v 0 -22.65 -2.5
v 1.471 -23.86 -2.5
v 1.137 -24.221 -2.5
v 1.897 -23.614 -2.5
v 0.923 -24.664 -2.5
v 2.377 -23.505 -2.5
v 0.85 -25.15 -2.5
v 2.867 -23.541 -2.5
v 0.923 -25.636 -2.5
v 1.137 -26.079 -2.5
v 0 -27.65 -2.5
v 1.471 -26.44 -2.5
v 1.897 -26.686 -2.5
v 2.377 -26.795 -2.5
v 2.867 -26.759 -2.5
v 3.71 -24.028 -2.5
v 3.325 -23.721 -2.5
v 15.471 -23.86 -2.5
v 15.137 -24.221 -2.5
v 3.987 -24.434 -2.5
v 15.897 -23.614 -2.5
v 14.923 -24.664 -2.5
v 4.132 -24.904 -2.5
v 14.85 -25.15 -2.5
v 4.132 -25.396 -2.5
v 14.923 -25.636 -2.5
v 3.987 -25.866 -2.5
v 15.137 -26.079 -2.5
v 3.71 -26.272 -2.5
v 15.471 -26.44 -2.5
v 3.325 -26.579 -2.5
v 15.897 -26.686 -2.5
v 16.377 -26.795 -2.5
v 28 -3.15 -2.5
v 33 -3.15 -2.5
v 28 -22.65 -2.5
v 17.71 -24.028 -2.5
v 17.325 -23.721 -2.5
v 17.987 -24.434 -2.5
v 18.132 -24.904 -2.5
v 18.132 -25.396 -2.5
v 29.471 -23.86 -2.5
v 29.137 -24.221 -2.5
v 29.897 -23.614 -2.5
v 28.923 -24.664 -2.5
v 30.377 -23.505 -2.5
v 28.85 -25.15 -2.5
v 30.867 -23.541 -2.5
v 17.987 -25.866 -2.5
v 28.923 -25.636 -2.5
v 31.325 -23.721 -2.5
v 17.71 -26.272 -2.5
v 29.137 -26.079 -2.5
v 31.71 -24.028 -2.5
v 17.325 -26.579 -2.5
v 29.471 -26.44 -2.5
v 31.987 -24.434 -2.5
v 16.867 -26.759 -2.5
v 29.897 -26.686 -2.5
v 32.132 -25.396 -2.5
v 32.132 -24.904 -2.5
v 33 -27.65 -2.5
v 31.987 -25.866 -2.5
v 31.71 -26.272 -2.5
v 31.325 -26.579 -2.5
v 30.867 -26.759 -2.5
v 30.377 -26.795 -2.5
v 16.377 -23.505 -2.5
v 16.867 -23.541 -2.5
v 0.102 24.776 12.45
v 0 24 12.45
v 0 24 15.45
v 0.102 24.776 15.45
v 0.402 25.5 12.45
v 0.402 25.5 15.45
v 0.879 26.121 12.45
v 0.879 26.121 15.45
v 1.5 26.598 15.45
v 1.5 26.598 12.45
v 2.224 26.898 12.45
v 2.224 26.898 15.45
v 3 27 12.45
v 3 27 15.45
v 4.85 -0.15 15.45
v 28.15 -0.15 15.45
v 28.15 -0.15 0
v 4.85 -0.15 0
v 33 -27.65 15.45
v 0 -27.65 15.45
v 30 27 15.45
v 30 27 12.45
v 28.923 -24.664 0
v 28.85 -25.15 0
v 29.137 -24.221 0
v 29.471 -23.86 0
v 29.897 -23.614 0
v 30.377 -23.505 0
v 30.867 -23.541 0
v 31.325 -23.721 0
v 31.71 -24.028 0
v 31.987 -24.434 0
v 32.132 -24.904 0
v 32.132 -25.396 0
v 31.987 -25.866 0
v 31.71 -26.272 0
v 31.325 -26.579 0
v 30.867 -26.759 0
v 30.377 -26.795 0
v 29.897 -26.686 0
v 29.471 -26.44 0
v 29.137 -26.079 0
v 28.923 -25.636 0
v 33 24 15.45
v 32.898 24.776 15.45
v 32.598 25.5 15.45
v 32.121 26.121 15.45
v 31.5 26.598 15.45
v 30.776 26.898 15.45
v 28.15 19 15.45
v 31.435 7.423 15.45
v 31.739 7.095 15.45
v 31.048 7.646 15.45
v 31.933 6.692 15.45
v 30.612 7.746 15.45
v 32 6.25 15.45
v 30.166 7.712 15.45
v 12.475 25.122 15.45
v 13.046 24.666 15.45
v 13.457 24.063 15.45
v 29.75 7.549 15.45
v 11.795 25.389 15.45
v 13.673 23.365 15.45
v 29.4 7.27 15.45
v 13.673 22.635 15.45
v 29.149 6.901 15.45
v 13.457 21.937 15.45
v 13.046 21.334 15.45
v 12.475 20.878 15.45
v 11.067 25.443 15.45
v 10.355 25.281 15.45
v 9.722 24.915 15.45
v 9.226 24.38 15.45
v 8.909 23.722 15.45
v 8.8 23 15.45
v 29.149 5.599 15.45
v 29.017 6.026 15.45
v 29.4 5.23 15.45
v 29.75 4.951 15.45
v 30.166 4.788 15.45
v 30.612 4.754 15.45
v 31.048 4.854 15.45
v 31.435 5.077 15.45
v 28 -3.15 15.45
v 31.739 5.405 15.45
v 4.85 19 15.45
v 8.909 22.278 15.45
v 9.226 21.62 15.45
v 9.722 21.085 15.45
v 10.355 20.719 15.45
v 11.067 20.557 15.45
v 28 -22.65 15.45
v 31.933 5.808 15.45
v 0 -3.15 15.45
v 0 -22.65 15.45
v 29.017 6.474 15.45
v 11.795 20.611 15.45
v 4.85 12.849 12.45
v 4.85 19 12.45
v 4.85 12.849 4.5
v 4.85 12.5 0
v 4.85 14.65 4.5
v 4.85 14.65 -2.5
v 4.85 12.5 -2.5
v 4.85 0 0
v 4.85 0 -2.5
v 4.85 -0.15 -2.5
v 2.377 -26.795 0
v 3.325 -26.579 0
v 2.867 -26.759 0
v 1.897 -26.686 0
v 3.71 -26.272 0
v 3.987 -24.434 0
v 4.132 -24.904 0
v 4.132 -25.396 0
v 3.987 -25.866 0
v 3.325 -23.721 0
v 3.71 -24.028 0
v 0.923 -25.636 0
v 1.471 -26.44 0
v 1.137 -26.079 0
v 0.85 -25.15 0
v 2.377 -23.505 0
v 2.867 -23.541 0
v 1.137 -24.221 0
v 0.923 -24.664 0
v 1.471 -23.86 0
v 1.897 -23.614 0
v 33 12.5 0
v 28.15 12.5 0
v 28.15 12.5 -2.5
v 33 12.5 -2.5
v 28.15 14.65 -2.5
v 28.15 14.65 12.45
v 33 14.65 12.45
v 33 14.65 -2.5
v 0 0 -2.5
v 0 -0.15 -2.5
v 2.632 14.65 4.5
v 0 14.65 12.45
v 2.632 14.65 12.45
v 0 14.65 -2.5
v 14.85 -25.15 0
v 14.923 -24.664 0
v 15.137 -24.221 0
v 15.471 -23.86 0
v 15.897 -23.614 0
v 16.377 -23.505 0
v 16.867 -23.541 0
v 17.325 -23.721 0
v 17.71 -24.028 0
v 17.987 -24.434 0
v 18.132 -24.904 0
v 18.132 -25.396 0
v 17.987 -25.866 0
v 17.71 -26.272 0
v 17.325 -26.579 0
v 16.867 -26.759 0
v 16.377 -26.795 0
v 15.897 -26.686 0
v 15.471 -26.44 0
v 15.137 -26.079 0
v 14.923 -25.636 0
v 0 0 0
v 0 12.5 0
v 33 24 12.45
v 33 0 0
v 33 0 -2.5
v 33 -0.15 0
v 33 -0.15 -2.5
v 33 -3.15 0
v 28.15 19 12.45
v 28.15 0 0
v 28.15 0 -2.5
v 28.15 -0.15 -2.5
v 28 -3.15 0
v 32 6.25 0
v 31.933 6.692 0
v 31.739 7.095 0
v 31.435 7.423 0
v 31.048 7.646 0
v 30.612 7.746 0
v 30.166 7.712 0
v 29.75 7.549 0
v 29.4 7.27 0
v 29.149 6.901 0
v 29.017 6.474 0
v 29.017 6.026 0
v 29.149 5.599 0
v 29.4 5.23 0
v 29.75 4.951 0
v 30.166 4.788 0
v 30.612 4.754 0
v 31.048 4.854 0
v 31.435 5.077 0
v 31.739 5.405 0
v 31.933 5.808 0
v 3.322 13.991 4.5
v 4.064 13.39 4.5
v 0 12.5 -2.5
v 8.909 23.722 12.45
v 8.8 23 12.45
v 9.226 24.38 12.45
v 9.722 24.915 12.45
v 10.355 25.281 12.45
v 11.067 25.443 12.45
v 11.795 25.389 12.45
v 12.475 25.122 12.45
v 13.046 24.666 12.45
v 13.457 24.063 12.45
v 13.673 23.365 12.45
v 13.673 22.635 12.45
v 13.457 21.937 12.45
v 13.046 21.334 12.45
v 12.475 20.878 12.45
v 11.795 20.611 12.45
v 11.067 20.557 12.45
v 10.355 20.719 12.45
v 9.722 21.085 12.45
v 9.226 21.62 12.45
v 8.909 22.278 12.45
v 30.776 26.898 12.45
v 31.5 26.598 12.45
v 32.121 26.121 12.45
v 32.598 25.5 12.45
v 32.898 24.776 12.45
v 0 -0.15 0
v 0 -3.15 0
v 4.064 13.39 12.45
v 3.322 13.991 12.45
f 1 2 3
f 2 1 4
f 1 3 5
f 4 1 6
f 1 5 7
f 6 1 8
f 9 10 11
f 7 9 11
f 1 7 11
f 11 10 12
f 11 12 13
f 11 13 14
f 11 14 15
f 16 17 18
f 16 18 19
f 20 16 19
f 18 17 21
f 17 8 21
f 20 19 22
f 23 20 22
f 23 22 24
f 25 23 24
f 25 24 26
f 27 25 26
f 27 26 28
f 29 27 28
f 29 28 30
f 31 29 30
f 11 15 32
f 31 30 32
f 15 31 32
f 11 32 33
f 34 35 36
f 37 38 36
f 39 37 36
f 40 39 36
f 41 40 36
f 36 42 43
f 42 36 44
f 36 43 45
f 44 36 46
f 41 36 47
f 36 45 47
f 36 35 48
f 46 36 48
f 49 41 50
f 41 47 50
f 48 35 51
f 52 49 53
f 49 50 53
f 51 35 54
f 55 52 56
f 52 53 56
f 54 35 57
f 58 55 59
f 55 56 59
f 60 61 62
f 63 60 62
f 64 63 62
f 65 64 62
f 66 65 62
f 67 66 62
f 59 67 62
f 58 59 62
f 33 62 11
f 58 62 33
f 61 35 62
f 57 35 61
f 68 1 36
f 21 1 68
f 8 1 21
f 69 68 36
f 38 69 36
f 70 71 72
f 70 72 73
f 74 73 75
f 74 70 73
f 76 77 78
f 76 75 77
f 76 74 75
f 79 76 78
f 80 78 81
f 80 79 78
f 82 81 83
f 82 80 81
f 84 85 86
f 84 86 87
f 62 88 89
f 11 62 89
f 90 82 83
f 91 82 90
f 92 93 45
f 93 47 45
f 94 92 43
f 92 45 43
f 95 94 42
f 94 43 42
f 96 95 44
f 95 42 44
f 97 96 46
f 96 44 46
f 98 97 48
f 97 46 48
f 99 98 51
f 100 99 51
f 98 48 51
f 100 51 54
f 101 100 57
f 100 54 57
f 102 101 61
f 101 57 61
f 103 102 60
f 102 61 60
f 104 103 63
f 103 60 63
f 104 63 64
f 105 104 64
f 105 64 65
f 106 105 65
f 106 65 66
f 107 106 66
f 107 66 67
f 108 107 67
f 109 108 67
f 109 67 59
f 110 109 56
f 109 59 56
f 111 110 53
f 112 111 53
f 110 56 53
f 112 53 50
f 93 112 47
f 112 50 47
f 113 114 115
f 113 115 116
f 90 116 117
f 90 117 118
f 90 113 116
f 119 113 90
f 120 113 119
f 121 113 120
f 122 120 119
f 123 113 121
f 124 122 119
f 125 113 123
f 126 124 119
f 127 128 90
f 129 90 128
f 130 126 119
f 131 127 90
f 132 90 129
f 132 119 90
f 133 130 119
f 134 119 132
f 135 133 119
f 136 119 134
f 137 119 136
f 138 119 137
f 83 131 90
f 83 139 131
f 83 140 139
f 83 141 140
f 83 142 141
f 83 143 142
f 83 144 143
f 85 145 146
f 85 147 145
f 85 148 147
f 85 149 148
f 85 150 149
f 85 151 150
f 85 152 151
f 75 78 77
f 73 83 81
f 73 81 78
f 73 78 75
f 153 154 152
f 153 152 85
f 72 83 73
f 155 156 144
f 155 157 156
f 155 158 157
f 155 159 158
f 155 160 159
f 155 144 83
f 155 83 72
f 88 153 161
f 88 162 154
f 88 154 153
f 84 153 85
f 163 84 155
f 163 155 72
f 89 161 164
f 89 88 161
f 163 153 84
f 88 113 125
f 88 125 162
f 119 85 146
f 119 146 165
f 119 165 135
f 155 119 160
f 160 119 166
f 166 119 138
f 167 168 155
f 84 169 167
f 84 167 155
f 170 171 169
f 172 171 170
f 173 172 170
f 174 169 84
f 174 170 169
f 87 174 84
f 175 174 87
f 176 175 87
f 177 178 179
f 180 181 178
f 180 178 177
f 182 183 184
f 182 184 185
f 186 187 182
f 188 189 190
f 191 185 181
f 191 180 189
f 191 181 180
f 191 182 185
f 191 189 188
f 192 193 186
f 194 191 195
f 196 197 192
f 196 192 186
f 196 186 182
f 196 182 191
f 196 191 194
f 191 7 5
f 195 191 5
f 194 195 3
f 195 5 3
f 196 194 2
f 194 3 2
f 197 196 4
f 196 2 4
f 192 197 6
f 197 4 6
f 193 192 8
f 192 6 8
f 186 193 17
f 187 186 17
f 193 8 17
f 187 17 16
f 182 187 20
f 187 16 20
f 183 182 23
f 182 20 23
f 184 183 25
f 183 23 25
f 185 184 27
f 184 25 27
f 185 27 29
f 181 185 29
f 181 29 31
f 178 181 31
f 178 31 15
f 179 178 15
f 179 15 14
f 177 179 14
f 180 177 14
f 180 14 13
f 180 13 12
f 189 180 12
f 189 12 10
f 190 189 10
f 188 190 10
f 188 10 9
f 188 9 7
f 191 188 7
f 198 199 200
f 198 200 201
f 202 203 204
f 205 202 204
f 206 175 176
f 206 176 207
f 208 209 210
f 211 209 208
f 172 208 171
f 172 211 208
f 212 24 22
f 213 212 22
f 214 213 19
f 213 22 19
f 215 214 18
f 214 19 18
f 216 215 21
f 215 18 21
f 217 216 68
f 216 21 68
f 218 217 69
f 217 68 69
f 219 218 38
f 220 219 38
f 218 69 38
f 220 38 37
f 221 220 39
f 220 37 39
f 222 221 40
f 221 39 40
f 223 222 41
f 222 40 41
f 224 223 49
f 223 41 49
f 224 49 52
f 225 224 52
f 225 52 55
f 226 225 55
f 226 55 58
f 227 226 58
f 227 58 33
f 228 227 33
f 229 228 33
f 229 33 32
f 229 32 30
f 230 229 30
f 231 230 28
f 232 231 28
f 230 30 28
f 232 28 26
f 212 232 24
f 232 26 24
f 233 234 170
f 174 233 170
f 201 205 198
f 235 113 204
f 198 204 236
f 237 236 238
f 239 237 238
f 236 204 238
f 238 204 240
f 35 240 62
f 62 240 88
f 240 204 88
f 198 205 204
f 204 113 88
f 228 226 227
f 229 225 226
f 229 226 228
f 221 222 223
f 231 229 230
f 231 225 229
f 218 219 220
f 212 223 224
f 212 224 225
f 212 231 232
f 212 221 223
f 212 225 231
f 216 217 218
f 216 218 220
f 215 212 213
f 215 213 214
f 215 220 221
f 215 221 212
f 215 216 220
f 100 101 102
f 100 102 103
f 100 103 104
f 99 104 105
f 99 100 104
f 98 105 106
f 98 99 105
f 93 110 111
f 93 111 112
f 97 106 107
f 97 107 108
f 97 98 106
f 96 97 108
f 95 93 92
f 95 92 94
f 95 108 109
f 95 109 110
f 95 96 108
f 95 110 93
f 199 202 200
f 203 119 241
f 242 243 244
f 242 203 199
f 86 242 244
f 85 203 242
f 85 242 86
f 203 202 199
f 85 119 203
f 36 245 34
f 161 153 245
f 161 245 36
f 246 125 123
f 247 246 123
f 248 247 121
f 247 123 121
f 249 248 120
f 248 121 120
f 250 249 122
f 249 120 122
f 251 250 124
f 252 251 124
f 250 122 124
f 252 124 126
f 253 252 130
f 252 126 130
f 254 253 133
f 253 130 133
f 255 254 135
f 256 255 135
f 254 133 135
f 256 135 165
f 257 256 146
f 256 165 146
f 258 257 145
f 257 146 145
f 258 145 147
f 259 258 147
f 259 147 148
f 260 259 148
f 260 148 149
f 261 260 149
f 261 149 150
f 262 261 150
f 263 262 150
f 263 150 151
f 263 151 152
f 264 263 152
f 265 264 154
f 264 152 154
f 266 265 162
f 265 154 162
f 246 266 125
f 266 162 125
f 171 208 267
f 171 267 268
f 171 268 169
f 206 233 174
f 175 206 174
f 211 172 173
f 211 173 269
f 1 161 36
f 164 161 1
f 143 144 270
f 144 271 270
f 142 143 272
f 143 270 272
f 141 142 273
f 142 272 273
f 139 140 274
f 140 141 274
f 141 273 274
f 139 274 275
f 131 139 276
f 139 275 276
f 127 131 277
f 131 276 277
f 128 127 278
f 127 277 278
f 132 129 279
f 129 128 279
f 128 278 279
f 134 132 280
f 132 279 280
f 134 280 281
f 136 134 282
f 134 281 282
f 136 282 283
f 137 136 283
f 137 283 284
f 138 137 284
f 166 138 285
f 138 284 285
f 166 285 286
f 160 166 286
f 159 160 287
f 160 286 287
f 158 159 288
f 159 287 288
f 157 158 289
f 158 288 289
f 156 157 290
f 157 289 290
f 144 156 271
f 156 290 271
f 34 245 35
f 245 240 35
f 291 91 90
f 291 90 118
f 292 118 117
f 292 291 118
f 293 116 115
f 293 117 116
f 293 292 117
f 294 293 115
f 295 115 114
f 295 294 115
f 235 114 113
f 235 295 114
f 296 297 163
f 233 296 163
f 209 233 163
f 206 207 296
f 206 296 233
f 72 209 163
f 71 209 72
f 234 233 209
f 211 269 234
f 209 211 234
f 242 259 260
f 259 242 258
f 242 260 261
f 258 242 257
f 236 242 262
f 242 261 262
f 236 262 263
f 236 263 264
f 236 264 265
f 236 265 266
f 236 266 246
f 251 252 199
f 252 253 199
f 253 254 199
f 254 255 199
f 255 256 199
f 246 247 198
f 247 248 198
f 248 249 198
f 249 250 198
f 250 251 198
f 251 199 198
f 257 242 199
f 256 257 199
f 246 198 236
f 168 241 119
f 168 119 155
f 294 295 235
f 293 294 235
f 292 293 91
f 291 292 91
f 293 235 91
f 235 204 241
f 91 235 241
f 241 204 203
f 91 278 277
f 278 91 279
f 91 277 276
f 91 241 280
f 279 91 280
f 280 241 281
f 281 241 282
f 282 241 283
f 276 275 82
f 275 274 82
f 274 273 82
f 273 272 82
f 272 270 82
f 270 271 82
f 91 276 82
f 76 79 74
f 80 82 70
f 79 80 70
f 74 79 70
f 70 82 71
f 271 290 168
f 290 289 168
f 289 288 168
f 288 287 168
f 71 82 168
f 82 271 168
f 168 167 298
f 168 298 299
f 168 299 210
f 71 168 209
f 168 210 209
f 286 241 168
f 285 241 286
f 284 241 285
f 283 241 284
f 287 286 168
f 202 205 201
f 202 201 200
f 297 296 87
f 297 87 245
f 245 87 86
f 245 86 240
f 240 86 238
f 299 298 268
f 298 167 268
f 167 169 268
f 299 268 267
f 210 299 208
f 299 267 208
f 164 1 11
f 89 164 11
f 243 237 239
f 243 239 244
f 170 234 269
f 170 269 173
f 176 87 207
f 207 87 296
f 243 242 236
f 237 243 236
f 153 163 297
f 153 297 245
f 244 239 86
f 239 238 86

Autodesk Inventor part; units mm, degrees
ref_plane "YZ Plane" through (0, 0, 0) normal (1, 0, 0) x (0, 1, 0)
ref_plane "Work Plane1" through (5, 0, 4.5) normal (0, 0, 1) x (1, 0, 0)
sketch "Sketch1" plane through (5, 0, 4.5) normal (0, 0, 1) x (1, 0, 0)
  circle A0 centre (25.5, 6.25) radius 1.5 projected
  line L0 (28, 14.65) -> (28, -27.65) projected
  line L1 (23.15, 14.65) -> (28, 14.65) projected
  line L2 (23.15, 14.65) -> (23.15, -0.15) projected
  line L3 (-0.15, -0.15) -> (23.15, -0.15) projected
  line L4 (-0.15, 14.65) -> (-0.15, -0.15) projected
  line L5 (-5, 14.65) -> (-0.15, 14.65) projected
  line L6 (-5, 14.65) -> (-5, -3.15) projected
  line L7 (23, -3.15) -> (-5, -3.15) projected
  circle A1 centre (25.5, -25.15) radius 1.5 projected
  circle A2 centre (-2.5, -25.15) radius 1.5 projected
  circle A3 centre (11.5, -25.15) radius 1.5 projected
  line L8 (23, -22.65) -> (23, -3.15) projected
  line L9 (23, -22.65) -> (-5, -22.65) projected
  line L10 (-5, -22.65) -> (-5, -27.65) projected
  line L11 (28, -27.65) -> (-5, -27.65) projected
  point P0 (-5, 0)
ref_plane "Work Plane2" through (28, 0, 0) normal (0, 0, 1) x (1, 0, 0)
extrude "Extrusion1" add sketch "Sketch1" against normal up to surface (4.5 mm away) contours L0 L11 L10 L9 L8 L7 L6 L5 L4 L3 L2 L1 | A1 | A2 | A3
sketch "Sketch2" plane through (33, -3.15, 0) normal (0, 0, -1) x (-1, 0, 0)
  circle A0 centre (2.5, 9.4) radius 1.5 projected
  line L0 (4.85, 17.8) -> (0, 17.8) projected
  line L1 (0, 17.8) -> (0, -24.5) projected
  line L2 (5, 0) -> (33, 0) projected
  line L3 (33, 0) -> (33, 17.8) projected
  line L4 (33, 17.8) -> (28.15, 17.8) projected
  line L5 (28.15, 17.8) -> (28.15, 3) projected
  line L6 (28.15, 3) -> (4.85, 3) projected
  line L7 (4.85, 3) -> (4.85, 17.8) projected
  line L8 (5, 15.65) -> (0, 15.65) projected
  line L9 (5, 3.15) -> (0, 3.15) projected
  line L10 (33, 15.65) -> (28, 15.65) projected
  line L11 (33, 3.15) -> (28, 3.15) projected
  line L12 (0, 17.8) -> (4.85, 17.8) projected
  line L13 (4.85, 17.8) -> (4.85, 3) projected
  line L14 (0, 17.8) -> (4.85, 17.8)
  line L15 (4.85, 17.8) -> (4.85, 15.65)
  line L16 (4.85, 15.65) -> (0, 15.65)
  line L17 (0, 15.65) -> (0, 17.8)
  line L18 (28.15, 17.8) -> (33, 17.8)
  line L19 (33, 17.8) -> (33, 15.65)
  line L20 (33, 15.65) -> (28.15, 15.65)
  line L21 (28.15, 15.65) -> (28.15, 17.8)
  line L22 (33, 0) -> (5, 0) projected
  line L23 (0, -24.5) -> (0, 17.8) projected
  line L24 (33, 0) -> (0, 0)
  line L25 (0, 0) -> (0, 3)
  line L26 (0, 3) -> (33, 3)
  line L27 (33, 3) -> (33, 0)
  line L28 (28.15, 3.15) -> (33, 3.15)
  line L29 (33, 3.15) -> (33, 3)
  line L30 (33, 3) -> (28.15, 3)
  line L31 (28.15, 3) -> (28.15, 3.15)
  line L32 (4.85, 3.15) -> (0, 3.15)
  line L33 (0, 3.15) -> (0, 3)
  line L34 (0, 3) -> (4.85, 3)
  line L35 (4.85, 3) -> (4.85, 3.15)
  line L36 (0, -24.5) -> (33, -24.5) projected
  line L37 (33, -24.5) -> (33, -19.5) projected
  line L38 (33, -19.5) -> (5, -19.5) projected
  line L39 (5, -19.5) -> (5, 0) projected
ref_plane "Work Plane3" through (0, -3.15, -2.5) normal (0, 0, 1) x (1, 0, 0)
extrude "Extrusion2" add sketch "Sketch2" along normal up to surface (2.5 mm away) contours L7 L8 L1 L0 | L7 L26 L1 L9 | L5 L11 L3 L26 | L5 L4 L3 L10
ref_plane "Work Plane5" through (11.25, 23, 12.45) normal (0, 0, 1) x (-1, 0, 0)
sketch "Sketch4" plane through (11.25, 23, 12.45) normal (0, 0, 1) x (-1, 0, 0)
  circle A0 centre (0, 0) radius 2.45 projected
  arc A1 (-21.75, -1) -> (-18.75, -4) centre (-18.75, -1) ccw projected
  line L0 (8.25, -4) -> (-18.75, -4) projected
  arc A2 (8.25, -4) -> (11.25, -1) centre (8.25, -1) ccw projected
  line L1 (11.25, 5.35) -> (11.25, -1) projected
  line L2 (6.4, 5.35) -> (11.25, 5.35) projected
  line L3 (6.4, 4) -> (6.4, 5.35) projected
  line L4 (-16.9, 4) -> (6.4, 4) projected
  line L5 (-16.9, 5.35) -> (-16.9, 4) projected
  line L6 (-21.75, 5.35) -> (-16.9, 5.35) projected
  line L7 (-21.75, -1) -> (-21.75, 5.35) projected
  point P0 (11.25, 23)
extrude "Extrusion3" add sketch "Sketch4" along normal blind 3
sketch "Sketch5" plane through (11.25, 23, 15.45) normal (0, 0, 1) x (1, 0, 0)
  line L0 (-6.4, -5.35) -> (-11.25, -5.35) projected
  line L1 (-6.4, -8.35) -> (-11.25, -8.35) projected
  line L2 (-11.25, -5.35) -> (-6.4, -5.35)
  line L3 (-6.4, -5.35) -> (-6.4, -8.35)
  line L4 (-6.4, -8.35) -> (-11.25, -8.35)
  line L5 (-11.25, -8.35) -> (-11.25, -5.35)
  line L6 (16.9, -5.35) -> (21.75, -5.35) projected
  line L7 (21.75, -8.35) -> (16.9, -8.35) projected
  line L8 (16.9, -5.35) -> (21.75, -5.35)
  line L9 (21.75, -5.35) -> (21.75, -8.35)
  line L10 (21.75, -8.35) -> (16.9, -8.35)
  line L11 (16.9, -8.35) -> (16.9, -5.35)
  circle A0 centre (19.25, -16.75) radius 1.5 projected
  line L12 (21.75, -50.65) -> (21.75, -8.35) projected
  line L13 (21.75, -8.35) -> (16.9, -8.35) projected
  line L14 (16.9, -8.35) -> (16.9, -23.15) projected
  line L15 (16.9, -23.15) -> (-6.4, -23.15) projected
  line L16 (-6.4, -23.15) -> (-6.4, -8.35) projected
  line L17 (-6.4, -8.35) -> (-11.25, -8.35) projected
  line L18 (-11.25, -8.35) -> (-11.25, -26.15) projected
  line L19 (-11.25, -26.15) -> (16.75, -26.15) projected
  line L20 (16.75, -26.15) -> (16.75, -45.65) projected
  line L21 (16.75, -45.65) -> (-11.25, -45.65) projected
  line L22 (-11.25, -45.65) -> (-11.25, -50.65) projected
  line L23 (-11.25, -50.65) -> (21.75, -50.65) projected
  point P0 (-11.25, -23)
extrude "Extrusion4" add sketch "Sketch5" against normal blind 3
sketch "Sketch6" plane through (5, 0, 4.5) normal (0, 0, 1) x (1, 0, 0)
  line L0 (-5, 14.65) -> (-0.15, 14.65) projected
  circle A0 centre (25.5, 6.25) radius 1.5 projected
  line L1 (28, 14.65) -> (28, -27.65) projected
  line L2 (23.15, 14.65) -> (28, 14.65) projected
  line L3 (23.15, 14.65) -> (23.15, -0.15) projected
  line L4 (-0.15, -0.15) -> (23.15, -0.15) projected
  line L5 (-0.15, 14.65) -> (-0.15, -0.15) projected
  line L6 (-5, 14.65) -> (-0.15, 14.65) projected
  line L7 (-5, 14.65) -> (-5, -3.15) projected
  line L8 (23, -3.15) -> (-5, -3.15) projected
  circle A1 centre (6.25, 23) radius 10 projected
  circle A2 centre (6.25, 23) radius 12
  line L9 (-2.3684, 14.65) -> (-5, 14.65)
  line L10 (-5, 12.5) -> (-5, 14.65) projected
  line L11 (-5, 14.65) -> (-5, 12.5)
  line L12 (-0.15, 12.5) -> (-5, 12.5) projected
  line L13 (-5, 12.5) -> (-0.15, 12.5)
  line L14 (-0.15, 12.5) -> (-0.15, 12.8491)
  line L15 (-0.15, 14.65) -> (-0.15, 12.5) projected
  circle A3 centre (25.5, -25.15) radius 1.5 projected
  circle A4 centre (-2.5, -25.15) radius 1.5 projected
  circle A5 centre (11.5, -25.15) radius 1.5 projected
  line L16 (23, -22.65) -> (23, -3.15) projected
  line L17 (23, -22.65) -> (-5, -22.65) projected
  line L18 (-5, -22.65) -> (-5, -27.65) projected
  line L19 (28, -27.65) -> (-5, -27.65) projected
  point P0 (-5, 0)
  dimension "d8" = 2
extrude "Extrusion5" add sketch "Sketch6" along normal up to surface (7.95 mm away) contours L0 A2 L5 L12 L7 | L12 L5 L4 L3 L2 L1 L19 L18 L17 L16 L8 L7 | A3 | A4 | A5
sketch "Sketch7" plane through (33, 0, 0) normal (1, 0, 0) x (0, 0, -1)
  line L0 (-15.45, -3.15) -> (0, -3.15) projected
  line L1 (-15.45, -3.15) -> (2.5, -3.15)
  line L2 (2.5, -3.15) -> (2.5, -22.65)
  line L3 (2.5, -22.65) -> (-15.45, -22.65)
  line L4 (-15.45, -22.65) -> (-15.45, -3.15)
  line L5 (-15.45, 4.75) -> (0, 4.75) projected
  line L6 (-12.45, 24) -> (-12.45, 14.65) projected
  line L7 (-12.45, 24) -> (-15.45, 24) projected
  line L8 (-15.45, 24) -> (-15.45, -27.65) projected
  line L9 (2.5, 0) -> (2.5, -0.15) projected
  line L10 (0, 0) -> (2.5, 0) projected
  line L11 (0, 12.5) -> (0, 0) projected
  line L12 (0, 12.5) -> (2.5, 12.5) projected
  line L13 (2.5, 14.65) -> (2.5, 12.5) projected
  line L14 (-12.45, 14.65) -> (2.5, 14.65) projected
  line L15 (-15.45, -22.65) -> (2.5, -22.65)
  line L16 (2.5, -22.65) -> (2.5, -27.65)
  line L17 (2.5, -27.65) -> (-15.45, -27.65)
  line L18 (-15.45, -27.65) -> (-15.45, -22.65)
  line L19 (0, -0.15) -> (0, -27.65) projected
  line L20 (0, -0.15) -> (2.5, -0.15) projected
  line L21 (-15.45, -27.65) -> (0, -27.65) projected
  point P0 (0, 0)
  point P1 (2.5, -3.15)
  dimension "d11" = 19.5
  dimension "d13" = 5
extrude "Extrusion6" add sketch "Sketch7" against normal blind 5 contours L0 L19 L3 L4 | L1 L2 L3 L19 | L3 L19 L17 L8 | L3 L16 L17 L19
extrude "Extrusion7" add sketch "Sketch7" against normal up to surface (33 mm away) contours L3 L19 L17 L8 | L3 L16 L17 L19
sketch "Sketch8" plane through (33, -27.65, -2.5) normal (0, 0, -1) x (-1, 0, 0)
  circle A0 centre (2.5, 2.5) radius 1.65
  circle A1 centre (16.5, 2.5) radius 1.65
  circle A2 centre (30.5, 2.5) radius 1.65
  line L0 (2.5, 2.5) -> (16.5, 2.5) construction
  line L1 (16.5, 2.5) -> (30.5, 2.5) construction
  line L2 (0, 0) -> (33, 0) construction
  line L3 (0, 0) -> (0, 24.5) construction
  line L4 (33, 0) -> (33, 5) construction
  point P0 (33, 27.65)
  dimension "d18" = 3.3
  dimension "d19" = 3.3
  dimension "d20" = 3.3
  dimension "d21" = 2.5
  dimension "d22" = 2.5
  dimension "d23" = 2.5
extrude "Extrusion8" cut sketch "Sketch8" against normal blind 2.5
properties part number "Bracket 2"
